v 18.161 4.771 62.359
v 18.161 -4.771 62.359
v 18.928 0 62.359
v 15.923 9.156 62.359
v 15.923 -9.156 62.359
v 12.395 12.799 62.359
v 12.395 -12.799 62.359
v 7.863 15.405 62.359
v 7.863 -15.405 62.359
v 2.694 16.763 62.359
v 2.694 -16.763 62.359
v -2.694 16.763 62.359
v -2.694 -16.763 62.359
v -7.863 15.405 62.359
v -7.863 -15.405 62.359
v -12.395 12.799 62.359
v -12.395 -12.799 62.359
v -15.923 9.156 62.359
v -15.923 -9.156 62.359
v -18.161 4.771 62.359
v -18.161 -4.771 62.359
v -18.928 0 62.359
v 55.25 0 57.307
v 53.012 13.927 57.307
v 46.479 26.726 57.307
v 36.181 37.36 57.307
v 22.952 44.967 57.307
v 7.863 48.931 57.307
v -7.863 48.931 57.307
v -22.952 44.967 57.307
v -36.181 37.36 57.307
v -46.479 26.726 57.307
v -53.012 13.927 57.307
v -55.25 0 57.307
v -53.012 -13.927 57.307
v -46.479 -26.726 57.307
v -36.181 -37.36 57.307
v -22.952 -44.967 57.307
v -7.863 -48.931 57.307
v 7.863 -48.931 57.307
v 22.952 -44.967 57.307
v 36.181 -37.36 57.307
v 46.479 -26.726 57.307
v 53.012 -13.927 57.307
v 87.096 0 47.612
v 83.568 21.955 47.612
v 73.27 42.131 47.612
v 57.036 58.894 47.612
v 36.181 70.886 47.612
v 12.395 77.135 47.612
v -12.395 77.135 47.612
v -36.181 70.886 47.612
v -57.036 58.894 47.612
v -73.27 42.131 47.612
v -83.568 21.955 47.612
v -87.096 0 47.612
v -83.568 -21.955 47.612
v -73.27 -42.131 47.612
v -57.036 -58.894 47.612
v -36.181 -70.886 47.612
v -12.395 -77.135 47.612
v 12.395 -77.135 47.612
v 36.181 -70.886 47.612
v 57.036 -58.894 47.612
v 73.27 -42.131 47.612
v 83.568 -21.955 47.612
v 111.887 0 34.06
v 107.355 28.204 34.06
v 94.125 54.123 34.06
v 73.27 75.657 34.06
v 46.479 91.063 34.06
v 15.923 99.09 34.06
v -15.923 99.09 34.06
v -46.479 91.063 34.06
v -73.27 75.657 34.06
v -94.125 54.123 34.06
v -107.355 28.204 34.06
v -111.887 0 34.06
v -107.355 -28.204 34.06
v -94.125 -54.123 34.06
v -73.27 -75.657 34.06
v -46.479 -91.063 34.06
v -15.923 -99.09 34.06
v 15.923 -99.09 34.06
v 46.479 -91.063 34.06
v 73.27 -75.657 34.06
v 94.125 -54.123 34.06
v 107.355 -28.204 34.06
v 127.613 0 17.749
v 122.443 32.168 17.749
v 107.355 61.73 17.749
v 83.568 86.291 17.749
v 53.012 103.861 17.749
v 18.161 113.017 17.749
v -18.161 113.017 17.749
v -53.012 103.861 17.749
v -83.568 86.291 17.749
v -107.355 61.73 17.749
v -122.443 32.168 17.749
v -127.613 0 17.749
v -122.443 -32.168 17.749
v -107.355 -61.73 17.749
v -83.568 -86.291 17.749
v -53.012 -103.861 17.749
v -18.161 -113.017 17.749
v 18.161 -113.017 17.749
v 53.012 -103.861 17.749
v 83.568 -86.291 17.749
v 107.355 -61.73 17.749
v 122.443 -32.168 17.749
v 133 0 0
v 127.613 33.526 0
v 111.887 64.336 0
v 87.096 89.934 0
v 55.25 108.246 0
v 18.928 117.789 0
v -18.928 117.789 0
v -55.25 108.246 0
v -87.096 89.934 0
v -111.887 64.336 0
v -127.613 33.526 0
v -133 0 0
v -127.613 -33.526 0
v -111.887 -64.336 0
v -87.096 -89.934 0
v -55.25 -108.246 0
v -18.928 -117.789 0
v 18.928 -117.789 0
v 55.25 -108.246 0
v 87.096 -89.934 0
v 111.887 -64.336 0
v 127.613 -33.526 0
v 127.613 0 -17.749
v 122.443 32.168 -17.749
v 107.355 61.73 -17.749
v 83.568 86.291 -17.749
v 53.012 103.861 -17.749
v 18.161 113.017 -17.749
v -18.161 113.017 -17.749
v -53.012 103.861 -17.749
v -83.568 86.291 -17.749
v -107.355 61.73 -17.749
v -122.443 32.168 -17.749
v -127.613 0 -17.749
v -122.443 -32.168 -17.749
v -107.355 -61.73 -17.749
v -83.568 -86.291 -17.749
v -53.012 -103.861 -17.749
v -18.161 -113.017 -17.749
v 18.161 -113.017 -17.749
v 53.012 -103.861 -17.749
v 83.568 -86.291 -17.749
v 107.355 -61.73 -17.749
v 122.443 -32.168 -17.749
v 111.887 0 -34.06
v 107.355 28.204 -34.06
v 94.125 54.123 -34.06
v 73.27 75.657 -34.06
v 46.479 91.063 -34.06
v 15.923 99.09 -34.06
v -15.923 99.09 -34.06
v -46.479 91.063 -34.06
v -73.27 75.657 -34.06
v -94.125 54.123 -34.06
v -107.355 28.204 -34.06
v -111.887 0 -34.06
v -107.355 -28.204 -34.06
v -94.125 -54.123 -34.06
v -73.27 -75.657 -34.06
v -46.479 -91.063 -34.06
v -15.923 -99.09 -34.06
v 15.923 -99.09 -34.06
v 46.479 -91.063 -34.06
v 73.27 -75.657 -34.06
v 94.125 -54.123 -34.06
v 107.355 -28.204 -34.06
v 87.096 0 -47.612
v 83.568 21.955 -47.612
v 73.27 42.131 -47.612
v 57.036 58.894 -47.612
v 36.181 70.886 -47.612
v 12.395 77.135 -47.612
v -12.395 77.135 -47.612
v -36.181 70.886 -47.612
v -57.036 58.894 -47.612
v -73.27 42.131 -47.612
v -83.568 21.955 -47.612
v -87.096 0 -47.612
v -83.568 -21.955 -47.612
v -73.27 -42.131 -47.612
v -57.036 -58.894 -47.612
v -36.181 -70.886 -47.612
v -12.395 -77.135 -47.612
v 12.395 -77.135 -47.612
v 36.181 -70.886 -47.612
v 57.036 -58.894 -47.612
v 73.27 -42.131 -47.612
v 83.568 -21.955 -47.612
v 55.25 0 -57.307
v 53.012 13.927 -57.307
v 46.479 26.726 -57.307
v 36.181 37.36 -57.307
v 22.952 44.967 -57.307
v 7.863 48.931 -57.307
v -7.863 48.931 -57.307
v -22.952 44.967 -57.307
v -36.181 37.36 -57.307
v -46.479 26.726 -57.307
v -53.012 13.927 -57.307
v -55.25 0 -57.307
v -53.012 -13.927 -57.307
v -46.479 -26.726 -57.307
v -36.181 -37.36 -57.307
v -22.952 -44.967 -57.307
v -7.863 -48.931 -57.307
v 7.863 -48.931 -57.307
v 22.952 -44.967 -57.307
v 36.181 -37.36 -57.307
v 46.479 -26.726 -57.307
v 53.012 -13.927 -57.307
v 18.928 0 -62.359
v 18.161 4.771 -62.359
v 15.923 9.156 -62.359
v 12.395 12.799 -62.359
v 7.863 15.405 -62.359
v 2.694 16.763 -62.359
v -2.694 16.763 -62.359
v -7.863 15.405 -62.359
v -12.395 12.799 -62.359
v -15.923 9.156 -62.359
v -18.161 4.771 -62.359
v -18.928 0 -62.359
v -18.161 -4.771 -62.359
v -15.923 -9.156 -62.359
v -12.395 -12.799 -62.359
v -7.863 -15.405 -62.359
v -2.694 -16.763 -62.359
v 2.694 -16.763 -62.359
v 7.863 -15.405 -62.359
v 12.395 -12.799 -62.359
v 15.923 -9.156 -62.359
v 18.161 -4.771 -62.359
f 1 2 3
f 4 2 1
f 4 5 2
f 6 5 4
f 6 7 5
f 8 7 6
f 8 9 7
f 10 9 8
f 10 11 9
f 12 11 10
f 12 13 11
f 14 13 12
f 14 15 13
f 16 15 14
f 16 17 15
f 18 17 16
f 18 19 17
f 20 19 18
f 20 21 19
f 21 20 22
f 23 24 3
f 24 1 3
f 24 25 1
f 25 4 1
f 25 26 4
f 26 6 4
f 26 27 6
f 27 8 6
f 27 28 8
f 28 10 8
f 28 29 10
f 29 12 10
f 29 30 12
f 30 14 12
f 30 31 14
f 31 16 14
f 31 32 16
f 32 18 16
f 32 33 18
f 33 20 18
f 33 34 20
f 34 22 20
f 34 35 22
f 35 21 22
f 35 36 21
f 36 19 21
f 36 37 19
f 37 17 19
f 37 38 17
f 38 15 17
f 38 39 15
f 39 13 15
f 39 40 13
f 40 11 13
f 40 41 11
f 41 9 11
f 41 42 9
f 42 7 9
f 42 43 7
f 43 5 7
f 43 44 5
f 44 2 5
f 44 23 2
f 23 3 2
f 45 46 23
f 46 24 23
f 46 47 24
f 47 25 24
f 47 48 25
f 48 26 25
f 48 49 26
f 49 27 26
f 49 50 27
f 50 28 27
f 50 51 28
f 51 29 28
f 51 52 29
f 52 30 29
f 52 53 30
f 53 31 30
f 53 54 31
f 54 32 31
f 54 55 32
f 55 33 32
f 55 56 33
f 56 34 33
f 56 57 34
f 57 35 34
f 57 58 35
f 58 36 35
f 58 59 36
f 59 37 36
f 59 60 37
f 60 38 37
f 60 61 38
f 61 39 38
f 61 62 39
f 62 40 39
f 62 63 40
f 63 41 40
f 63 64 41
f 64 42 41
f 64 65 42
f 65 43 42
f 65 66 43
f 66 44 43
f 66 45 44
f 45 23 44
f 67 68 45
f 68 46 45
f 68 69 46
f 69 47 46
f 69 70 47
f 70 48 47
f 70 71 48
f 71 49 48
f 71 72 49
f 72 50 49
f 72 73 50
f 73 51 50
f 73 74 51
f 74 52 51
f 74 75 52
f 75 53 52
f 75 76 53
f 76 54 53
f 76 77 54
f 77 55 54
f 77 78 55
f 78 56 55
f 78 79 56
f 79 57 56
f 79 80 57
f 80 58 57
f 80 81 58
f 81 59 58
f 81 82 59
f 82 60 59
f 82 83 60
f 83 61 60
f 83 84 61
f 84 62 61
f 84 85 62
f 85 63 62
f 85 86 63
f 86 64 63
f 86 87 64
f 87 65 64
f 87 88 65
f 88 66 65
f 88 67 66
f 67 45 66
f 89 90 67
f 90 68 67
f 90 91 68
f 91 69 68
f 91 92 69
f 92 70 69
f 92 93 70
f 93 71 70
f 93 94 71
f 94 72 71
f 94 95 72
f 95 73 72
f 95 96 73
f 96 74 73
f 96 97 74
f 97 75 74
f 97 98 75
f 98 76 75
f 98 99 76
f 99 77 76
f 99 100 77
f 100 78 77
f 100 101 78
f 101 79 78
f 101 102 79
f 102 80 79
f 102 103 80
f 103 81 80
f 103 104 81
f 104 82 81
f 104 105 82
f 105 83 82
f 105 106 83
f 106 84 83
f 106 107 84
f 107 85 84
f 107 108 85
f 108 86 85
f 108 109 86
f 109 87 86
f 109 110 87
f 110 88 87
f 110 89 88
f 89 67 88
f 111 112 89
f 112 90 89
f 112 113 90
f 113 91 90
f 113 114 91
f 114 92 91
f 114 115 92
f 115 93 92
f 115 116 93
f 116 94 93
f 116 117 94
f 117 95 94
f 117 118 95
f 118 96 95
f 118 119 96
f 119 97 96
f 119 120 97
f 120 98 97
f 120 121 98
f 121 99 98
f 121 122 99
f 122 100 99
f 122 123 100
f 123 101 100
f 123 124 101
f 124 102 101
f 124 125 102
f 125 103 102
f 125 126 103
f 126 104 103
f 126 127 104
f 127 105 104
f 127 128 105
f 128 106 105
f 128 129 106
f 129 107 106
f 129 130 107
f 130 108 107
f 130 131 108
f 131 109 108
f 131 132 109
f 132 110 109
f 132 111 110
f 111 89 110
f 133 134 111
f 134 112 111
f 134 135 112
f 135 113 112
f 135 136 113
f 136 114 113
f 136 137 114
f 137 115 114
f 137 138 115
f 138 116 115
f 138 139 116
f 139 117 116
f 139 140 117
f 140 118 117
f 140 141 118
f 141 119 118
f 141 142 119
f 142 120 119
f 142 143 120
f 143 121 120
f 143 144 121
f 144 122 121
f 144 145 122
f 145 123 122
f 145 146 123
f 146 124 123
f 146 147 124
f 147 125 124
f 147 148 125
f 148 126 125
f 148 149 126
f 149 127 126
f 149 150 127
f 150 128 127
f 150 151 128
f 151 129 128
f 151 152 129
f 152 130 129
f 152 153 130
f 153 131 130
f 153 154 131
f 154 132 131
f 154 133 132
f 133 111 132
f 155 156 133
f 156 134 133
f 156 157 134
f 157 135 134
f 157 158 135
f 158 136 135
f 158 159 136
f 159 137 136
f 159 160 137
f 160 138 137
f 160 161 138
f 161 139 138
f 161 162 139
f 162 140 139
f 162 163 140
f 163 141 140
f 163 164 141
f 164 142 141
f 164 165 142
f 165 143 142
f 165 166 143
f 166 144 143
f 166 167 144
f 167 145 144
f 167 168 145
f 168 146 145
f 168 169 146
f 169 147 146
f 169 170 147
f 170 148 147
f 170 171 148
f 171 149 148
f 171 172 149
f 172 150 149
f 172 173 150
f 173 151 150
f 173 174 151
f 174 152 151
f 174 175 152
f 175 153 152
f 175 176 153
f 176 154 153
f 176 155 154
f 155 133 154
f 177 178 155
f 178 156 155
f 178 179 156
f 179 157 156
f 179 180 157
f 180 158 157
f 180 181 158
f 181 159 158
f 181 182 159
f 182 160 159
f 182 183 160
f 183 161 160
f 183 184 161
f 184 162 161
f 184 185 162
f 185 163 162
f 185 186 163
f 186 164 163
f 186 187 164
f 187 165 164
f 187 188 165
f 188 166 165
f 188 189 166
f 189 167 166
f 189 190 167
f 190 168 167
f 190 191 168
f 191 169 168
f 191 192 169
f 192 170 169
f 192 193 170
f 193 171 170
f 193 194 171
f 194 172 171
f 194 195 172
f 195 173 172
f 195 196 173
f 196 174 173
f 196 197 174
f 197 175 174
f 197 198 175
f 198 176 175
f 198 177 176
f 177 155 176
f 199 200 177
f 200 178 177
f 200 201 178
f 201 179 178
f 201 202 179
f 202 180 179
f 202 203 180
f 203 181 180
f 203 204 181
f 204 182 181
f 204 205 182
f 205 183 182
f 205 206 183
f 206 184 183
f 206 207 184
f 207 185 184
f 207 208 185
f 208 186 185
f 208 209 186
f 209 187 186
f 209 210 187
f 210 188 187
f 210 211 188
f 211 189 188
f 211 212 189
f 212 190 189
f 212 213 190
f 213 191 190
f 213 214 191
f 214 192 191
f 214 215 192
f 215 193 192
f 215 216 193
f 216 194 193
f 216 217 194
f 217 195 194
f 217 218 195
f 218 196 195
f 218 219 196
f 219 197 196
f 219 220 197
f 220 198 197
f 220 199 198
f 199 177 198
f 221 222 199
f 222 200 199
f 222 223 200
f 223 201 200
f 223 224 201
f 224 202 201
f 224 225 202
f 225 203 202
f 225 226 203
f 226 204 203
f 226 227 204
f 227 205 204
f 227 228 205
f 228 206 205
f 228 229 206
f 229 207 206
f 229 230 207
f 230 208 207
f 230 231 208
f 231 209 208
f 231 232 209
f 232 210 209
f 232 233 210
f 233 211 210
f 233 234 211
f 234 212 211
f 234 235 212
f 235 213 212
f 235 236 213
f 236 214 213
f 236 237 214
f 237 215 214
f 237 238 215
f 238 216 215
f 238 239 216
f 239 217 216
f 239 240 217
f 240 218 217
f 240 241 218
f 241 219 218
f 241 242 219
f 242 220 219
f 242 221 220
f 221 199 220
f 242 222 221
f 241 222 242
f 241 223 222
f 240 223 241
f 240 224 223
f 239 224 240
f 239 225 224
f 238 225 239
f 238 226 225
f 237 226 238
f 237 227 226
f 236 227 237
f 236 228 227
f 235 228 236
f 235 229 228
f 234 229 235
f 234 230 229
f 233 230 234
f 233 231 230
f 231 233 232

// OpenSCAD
// Generated by SolidPython 1.0.1 on 2020-07-29 00:46:54


scale(v = [19, 17, 9]) {
	sphere(r = 7);
}
/***********************************************
*********      SolidPython code:      **********
************************************************
 
# import packages: SolidPython
from solid import *
from solid.utils import *
from itertools import chain, combinations, permutations


class Resize:

    def __init__(self, scad_file):
        self.scad_file = scad_file
        #self.scad_file = import_scad(scad_file)
        # cone/cylinder param:
        self.r1 = 0
        self.r2 = 0
        self.h = 0
        # rectangular prism param:
        self.w = 0
        self.l = 0
        # ellipse param:
        self.r = 0

    # import OpenScad code (file name corresponds to shape)


    # classify shape + parameters
    def assign(self, param1, param2, param3):
        if self.scad_file == 'cone.scad':
            self.r1 = param1
            self.r2 = param2
            self.h = param3
        elif self.scad_file == 'cylinder.scad':
            self.r1 = param1
            self.r2 = param2
            self.h = param3
        elif self.scad_file == 'rectangularPrism.scad':
            self.h = param1
            self.l = param2
            self.w = param3
        else:
            self.r = param1
            self.h = param2

    # resize parameters
    def iterate(self):
        x = range(3, 20, 2)
        i = 1
        if self.scad_file == 'cone.scad':
            tempList = list(permutations(x, 2))
            for temp in tempList:
                param1 = temp[0]
                param2 = temp[1]
                filepath = 'produced_scad_files/' + 'cone' + str(param1) + '_' + str(param2) + '_' + '.scad'
                scad_render_to_file(cylinder(h=param1, r1=param2, r2=0), filepath)

        elif self.scad_file == 'cylinder.scad':
            tempList = list(permutations(x, 3))
            for temp in tempList:
                param1 = temp[0]
                param2 = temp[1]
                filepath = 'produced_scad_files/' + 'cylinder' + str(param1) + '_' + str(param2) + '_' + '.scad'
                scad_render_to_file(cylinder(h=param1, r1=param2, r2=param2), filepath)

        elif self.scad_file == 'rectangularPrism.scad':
            tempList = list(permutations(x, 3))
            for temp in tempList:
                param1 = temp[0]
                param2 = temp[1]
                param3 = temp[2]
                filepath = 'produced_scad_files/' + 'rectangularPrism' + str(param1) + '_' + str(param2) + '_' + str(
                    param3) + '.scad'
                scad_render_to_file(cube(size=(param1, param2, param3)), filepath)

        elif self.scad_file == 'ellipse.scad':
            tempList = list(permutations(x, 4))
            for temp in tempList:
                param1 = temp[0]
                param2 = temp[1]
                param3 = temp[2]
                param4 = temp[3]
                filepath = 'produced_scad_files/' + 'ellipse' + str(param1) + '_' + str(param2) + '_' + str(param3) + '_' + str(param4) + '.scad'
                scad_render_to_file(scale([param1, param2, param3])(sphere(r=param4)), filepath)

    def render_to_scadfile(self):
        scad_render_to_file(scad, 'example.scad') 
 
************************************************/
